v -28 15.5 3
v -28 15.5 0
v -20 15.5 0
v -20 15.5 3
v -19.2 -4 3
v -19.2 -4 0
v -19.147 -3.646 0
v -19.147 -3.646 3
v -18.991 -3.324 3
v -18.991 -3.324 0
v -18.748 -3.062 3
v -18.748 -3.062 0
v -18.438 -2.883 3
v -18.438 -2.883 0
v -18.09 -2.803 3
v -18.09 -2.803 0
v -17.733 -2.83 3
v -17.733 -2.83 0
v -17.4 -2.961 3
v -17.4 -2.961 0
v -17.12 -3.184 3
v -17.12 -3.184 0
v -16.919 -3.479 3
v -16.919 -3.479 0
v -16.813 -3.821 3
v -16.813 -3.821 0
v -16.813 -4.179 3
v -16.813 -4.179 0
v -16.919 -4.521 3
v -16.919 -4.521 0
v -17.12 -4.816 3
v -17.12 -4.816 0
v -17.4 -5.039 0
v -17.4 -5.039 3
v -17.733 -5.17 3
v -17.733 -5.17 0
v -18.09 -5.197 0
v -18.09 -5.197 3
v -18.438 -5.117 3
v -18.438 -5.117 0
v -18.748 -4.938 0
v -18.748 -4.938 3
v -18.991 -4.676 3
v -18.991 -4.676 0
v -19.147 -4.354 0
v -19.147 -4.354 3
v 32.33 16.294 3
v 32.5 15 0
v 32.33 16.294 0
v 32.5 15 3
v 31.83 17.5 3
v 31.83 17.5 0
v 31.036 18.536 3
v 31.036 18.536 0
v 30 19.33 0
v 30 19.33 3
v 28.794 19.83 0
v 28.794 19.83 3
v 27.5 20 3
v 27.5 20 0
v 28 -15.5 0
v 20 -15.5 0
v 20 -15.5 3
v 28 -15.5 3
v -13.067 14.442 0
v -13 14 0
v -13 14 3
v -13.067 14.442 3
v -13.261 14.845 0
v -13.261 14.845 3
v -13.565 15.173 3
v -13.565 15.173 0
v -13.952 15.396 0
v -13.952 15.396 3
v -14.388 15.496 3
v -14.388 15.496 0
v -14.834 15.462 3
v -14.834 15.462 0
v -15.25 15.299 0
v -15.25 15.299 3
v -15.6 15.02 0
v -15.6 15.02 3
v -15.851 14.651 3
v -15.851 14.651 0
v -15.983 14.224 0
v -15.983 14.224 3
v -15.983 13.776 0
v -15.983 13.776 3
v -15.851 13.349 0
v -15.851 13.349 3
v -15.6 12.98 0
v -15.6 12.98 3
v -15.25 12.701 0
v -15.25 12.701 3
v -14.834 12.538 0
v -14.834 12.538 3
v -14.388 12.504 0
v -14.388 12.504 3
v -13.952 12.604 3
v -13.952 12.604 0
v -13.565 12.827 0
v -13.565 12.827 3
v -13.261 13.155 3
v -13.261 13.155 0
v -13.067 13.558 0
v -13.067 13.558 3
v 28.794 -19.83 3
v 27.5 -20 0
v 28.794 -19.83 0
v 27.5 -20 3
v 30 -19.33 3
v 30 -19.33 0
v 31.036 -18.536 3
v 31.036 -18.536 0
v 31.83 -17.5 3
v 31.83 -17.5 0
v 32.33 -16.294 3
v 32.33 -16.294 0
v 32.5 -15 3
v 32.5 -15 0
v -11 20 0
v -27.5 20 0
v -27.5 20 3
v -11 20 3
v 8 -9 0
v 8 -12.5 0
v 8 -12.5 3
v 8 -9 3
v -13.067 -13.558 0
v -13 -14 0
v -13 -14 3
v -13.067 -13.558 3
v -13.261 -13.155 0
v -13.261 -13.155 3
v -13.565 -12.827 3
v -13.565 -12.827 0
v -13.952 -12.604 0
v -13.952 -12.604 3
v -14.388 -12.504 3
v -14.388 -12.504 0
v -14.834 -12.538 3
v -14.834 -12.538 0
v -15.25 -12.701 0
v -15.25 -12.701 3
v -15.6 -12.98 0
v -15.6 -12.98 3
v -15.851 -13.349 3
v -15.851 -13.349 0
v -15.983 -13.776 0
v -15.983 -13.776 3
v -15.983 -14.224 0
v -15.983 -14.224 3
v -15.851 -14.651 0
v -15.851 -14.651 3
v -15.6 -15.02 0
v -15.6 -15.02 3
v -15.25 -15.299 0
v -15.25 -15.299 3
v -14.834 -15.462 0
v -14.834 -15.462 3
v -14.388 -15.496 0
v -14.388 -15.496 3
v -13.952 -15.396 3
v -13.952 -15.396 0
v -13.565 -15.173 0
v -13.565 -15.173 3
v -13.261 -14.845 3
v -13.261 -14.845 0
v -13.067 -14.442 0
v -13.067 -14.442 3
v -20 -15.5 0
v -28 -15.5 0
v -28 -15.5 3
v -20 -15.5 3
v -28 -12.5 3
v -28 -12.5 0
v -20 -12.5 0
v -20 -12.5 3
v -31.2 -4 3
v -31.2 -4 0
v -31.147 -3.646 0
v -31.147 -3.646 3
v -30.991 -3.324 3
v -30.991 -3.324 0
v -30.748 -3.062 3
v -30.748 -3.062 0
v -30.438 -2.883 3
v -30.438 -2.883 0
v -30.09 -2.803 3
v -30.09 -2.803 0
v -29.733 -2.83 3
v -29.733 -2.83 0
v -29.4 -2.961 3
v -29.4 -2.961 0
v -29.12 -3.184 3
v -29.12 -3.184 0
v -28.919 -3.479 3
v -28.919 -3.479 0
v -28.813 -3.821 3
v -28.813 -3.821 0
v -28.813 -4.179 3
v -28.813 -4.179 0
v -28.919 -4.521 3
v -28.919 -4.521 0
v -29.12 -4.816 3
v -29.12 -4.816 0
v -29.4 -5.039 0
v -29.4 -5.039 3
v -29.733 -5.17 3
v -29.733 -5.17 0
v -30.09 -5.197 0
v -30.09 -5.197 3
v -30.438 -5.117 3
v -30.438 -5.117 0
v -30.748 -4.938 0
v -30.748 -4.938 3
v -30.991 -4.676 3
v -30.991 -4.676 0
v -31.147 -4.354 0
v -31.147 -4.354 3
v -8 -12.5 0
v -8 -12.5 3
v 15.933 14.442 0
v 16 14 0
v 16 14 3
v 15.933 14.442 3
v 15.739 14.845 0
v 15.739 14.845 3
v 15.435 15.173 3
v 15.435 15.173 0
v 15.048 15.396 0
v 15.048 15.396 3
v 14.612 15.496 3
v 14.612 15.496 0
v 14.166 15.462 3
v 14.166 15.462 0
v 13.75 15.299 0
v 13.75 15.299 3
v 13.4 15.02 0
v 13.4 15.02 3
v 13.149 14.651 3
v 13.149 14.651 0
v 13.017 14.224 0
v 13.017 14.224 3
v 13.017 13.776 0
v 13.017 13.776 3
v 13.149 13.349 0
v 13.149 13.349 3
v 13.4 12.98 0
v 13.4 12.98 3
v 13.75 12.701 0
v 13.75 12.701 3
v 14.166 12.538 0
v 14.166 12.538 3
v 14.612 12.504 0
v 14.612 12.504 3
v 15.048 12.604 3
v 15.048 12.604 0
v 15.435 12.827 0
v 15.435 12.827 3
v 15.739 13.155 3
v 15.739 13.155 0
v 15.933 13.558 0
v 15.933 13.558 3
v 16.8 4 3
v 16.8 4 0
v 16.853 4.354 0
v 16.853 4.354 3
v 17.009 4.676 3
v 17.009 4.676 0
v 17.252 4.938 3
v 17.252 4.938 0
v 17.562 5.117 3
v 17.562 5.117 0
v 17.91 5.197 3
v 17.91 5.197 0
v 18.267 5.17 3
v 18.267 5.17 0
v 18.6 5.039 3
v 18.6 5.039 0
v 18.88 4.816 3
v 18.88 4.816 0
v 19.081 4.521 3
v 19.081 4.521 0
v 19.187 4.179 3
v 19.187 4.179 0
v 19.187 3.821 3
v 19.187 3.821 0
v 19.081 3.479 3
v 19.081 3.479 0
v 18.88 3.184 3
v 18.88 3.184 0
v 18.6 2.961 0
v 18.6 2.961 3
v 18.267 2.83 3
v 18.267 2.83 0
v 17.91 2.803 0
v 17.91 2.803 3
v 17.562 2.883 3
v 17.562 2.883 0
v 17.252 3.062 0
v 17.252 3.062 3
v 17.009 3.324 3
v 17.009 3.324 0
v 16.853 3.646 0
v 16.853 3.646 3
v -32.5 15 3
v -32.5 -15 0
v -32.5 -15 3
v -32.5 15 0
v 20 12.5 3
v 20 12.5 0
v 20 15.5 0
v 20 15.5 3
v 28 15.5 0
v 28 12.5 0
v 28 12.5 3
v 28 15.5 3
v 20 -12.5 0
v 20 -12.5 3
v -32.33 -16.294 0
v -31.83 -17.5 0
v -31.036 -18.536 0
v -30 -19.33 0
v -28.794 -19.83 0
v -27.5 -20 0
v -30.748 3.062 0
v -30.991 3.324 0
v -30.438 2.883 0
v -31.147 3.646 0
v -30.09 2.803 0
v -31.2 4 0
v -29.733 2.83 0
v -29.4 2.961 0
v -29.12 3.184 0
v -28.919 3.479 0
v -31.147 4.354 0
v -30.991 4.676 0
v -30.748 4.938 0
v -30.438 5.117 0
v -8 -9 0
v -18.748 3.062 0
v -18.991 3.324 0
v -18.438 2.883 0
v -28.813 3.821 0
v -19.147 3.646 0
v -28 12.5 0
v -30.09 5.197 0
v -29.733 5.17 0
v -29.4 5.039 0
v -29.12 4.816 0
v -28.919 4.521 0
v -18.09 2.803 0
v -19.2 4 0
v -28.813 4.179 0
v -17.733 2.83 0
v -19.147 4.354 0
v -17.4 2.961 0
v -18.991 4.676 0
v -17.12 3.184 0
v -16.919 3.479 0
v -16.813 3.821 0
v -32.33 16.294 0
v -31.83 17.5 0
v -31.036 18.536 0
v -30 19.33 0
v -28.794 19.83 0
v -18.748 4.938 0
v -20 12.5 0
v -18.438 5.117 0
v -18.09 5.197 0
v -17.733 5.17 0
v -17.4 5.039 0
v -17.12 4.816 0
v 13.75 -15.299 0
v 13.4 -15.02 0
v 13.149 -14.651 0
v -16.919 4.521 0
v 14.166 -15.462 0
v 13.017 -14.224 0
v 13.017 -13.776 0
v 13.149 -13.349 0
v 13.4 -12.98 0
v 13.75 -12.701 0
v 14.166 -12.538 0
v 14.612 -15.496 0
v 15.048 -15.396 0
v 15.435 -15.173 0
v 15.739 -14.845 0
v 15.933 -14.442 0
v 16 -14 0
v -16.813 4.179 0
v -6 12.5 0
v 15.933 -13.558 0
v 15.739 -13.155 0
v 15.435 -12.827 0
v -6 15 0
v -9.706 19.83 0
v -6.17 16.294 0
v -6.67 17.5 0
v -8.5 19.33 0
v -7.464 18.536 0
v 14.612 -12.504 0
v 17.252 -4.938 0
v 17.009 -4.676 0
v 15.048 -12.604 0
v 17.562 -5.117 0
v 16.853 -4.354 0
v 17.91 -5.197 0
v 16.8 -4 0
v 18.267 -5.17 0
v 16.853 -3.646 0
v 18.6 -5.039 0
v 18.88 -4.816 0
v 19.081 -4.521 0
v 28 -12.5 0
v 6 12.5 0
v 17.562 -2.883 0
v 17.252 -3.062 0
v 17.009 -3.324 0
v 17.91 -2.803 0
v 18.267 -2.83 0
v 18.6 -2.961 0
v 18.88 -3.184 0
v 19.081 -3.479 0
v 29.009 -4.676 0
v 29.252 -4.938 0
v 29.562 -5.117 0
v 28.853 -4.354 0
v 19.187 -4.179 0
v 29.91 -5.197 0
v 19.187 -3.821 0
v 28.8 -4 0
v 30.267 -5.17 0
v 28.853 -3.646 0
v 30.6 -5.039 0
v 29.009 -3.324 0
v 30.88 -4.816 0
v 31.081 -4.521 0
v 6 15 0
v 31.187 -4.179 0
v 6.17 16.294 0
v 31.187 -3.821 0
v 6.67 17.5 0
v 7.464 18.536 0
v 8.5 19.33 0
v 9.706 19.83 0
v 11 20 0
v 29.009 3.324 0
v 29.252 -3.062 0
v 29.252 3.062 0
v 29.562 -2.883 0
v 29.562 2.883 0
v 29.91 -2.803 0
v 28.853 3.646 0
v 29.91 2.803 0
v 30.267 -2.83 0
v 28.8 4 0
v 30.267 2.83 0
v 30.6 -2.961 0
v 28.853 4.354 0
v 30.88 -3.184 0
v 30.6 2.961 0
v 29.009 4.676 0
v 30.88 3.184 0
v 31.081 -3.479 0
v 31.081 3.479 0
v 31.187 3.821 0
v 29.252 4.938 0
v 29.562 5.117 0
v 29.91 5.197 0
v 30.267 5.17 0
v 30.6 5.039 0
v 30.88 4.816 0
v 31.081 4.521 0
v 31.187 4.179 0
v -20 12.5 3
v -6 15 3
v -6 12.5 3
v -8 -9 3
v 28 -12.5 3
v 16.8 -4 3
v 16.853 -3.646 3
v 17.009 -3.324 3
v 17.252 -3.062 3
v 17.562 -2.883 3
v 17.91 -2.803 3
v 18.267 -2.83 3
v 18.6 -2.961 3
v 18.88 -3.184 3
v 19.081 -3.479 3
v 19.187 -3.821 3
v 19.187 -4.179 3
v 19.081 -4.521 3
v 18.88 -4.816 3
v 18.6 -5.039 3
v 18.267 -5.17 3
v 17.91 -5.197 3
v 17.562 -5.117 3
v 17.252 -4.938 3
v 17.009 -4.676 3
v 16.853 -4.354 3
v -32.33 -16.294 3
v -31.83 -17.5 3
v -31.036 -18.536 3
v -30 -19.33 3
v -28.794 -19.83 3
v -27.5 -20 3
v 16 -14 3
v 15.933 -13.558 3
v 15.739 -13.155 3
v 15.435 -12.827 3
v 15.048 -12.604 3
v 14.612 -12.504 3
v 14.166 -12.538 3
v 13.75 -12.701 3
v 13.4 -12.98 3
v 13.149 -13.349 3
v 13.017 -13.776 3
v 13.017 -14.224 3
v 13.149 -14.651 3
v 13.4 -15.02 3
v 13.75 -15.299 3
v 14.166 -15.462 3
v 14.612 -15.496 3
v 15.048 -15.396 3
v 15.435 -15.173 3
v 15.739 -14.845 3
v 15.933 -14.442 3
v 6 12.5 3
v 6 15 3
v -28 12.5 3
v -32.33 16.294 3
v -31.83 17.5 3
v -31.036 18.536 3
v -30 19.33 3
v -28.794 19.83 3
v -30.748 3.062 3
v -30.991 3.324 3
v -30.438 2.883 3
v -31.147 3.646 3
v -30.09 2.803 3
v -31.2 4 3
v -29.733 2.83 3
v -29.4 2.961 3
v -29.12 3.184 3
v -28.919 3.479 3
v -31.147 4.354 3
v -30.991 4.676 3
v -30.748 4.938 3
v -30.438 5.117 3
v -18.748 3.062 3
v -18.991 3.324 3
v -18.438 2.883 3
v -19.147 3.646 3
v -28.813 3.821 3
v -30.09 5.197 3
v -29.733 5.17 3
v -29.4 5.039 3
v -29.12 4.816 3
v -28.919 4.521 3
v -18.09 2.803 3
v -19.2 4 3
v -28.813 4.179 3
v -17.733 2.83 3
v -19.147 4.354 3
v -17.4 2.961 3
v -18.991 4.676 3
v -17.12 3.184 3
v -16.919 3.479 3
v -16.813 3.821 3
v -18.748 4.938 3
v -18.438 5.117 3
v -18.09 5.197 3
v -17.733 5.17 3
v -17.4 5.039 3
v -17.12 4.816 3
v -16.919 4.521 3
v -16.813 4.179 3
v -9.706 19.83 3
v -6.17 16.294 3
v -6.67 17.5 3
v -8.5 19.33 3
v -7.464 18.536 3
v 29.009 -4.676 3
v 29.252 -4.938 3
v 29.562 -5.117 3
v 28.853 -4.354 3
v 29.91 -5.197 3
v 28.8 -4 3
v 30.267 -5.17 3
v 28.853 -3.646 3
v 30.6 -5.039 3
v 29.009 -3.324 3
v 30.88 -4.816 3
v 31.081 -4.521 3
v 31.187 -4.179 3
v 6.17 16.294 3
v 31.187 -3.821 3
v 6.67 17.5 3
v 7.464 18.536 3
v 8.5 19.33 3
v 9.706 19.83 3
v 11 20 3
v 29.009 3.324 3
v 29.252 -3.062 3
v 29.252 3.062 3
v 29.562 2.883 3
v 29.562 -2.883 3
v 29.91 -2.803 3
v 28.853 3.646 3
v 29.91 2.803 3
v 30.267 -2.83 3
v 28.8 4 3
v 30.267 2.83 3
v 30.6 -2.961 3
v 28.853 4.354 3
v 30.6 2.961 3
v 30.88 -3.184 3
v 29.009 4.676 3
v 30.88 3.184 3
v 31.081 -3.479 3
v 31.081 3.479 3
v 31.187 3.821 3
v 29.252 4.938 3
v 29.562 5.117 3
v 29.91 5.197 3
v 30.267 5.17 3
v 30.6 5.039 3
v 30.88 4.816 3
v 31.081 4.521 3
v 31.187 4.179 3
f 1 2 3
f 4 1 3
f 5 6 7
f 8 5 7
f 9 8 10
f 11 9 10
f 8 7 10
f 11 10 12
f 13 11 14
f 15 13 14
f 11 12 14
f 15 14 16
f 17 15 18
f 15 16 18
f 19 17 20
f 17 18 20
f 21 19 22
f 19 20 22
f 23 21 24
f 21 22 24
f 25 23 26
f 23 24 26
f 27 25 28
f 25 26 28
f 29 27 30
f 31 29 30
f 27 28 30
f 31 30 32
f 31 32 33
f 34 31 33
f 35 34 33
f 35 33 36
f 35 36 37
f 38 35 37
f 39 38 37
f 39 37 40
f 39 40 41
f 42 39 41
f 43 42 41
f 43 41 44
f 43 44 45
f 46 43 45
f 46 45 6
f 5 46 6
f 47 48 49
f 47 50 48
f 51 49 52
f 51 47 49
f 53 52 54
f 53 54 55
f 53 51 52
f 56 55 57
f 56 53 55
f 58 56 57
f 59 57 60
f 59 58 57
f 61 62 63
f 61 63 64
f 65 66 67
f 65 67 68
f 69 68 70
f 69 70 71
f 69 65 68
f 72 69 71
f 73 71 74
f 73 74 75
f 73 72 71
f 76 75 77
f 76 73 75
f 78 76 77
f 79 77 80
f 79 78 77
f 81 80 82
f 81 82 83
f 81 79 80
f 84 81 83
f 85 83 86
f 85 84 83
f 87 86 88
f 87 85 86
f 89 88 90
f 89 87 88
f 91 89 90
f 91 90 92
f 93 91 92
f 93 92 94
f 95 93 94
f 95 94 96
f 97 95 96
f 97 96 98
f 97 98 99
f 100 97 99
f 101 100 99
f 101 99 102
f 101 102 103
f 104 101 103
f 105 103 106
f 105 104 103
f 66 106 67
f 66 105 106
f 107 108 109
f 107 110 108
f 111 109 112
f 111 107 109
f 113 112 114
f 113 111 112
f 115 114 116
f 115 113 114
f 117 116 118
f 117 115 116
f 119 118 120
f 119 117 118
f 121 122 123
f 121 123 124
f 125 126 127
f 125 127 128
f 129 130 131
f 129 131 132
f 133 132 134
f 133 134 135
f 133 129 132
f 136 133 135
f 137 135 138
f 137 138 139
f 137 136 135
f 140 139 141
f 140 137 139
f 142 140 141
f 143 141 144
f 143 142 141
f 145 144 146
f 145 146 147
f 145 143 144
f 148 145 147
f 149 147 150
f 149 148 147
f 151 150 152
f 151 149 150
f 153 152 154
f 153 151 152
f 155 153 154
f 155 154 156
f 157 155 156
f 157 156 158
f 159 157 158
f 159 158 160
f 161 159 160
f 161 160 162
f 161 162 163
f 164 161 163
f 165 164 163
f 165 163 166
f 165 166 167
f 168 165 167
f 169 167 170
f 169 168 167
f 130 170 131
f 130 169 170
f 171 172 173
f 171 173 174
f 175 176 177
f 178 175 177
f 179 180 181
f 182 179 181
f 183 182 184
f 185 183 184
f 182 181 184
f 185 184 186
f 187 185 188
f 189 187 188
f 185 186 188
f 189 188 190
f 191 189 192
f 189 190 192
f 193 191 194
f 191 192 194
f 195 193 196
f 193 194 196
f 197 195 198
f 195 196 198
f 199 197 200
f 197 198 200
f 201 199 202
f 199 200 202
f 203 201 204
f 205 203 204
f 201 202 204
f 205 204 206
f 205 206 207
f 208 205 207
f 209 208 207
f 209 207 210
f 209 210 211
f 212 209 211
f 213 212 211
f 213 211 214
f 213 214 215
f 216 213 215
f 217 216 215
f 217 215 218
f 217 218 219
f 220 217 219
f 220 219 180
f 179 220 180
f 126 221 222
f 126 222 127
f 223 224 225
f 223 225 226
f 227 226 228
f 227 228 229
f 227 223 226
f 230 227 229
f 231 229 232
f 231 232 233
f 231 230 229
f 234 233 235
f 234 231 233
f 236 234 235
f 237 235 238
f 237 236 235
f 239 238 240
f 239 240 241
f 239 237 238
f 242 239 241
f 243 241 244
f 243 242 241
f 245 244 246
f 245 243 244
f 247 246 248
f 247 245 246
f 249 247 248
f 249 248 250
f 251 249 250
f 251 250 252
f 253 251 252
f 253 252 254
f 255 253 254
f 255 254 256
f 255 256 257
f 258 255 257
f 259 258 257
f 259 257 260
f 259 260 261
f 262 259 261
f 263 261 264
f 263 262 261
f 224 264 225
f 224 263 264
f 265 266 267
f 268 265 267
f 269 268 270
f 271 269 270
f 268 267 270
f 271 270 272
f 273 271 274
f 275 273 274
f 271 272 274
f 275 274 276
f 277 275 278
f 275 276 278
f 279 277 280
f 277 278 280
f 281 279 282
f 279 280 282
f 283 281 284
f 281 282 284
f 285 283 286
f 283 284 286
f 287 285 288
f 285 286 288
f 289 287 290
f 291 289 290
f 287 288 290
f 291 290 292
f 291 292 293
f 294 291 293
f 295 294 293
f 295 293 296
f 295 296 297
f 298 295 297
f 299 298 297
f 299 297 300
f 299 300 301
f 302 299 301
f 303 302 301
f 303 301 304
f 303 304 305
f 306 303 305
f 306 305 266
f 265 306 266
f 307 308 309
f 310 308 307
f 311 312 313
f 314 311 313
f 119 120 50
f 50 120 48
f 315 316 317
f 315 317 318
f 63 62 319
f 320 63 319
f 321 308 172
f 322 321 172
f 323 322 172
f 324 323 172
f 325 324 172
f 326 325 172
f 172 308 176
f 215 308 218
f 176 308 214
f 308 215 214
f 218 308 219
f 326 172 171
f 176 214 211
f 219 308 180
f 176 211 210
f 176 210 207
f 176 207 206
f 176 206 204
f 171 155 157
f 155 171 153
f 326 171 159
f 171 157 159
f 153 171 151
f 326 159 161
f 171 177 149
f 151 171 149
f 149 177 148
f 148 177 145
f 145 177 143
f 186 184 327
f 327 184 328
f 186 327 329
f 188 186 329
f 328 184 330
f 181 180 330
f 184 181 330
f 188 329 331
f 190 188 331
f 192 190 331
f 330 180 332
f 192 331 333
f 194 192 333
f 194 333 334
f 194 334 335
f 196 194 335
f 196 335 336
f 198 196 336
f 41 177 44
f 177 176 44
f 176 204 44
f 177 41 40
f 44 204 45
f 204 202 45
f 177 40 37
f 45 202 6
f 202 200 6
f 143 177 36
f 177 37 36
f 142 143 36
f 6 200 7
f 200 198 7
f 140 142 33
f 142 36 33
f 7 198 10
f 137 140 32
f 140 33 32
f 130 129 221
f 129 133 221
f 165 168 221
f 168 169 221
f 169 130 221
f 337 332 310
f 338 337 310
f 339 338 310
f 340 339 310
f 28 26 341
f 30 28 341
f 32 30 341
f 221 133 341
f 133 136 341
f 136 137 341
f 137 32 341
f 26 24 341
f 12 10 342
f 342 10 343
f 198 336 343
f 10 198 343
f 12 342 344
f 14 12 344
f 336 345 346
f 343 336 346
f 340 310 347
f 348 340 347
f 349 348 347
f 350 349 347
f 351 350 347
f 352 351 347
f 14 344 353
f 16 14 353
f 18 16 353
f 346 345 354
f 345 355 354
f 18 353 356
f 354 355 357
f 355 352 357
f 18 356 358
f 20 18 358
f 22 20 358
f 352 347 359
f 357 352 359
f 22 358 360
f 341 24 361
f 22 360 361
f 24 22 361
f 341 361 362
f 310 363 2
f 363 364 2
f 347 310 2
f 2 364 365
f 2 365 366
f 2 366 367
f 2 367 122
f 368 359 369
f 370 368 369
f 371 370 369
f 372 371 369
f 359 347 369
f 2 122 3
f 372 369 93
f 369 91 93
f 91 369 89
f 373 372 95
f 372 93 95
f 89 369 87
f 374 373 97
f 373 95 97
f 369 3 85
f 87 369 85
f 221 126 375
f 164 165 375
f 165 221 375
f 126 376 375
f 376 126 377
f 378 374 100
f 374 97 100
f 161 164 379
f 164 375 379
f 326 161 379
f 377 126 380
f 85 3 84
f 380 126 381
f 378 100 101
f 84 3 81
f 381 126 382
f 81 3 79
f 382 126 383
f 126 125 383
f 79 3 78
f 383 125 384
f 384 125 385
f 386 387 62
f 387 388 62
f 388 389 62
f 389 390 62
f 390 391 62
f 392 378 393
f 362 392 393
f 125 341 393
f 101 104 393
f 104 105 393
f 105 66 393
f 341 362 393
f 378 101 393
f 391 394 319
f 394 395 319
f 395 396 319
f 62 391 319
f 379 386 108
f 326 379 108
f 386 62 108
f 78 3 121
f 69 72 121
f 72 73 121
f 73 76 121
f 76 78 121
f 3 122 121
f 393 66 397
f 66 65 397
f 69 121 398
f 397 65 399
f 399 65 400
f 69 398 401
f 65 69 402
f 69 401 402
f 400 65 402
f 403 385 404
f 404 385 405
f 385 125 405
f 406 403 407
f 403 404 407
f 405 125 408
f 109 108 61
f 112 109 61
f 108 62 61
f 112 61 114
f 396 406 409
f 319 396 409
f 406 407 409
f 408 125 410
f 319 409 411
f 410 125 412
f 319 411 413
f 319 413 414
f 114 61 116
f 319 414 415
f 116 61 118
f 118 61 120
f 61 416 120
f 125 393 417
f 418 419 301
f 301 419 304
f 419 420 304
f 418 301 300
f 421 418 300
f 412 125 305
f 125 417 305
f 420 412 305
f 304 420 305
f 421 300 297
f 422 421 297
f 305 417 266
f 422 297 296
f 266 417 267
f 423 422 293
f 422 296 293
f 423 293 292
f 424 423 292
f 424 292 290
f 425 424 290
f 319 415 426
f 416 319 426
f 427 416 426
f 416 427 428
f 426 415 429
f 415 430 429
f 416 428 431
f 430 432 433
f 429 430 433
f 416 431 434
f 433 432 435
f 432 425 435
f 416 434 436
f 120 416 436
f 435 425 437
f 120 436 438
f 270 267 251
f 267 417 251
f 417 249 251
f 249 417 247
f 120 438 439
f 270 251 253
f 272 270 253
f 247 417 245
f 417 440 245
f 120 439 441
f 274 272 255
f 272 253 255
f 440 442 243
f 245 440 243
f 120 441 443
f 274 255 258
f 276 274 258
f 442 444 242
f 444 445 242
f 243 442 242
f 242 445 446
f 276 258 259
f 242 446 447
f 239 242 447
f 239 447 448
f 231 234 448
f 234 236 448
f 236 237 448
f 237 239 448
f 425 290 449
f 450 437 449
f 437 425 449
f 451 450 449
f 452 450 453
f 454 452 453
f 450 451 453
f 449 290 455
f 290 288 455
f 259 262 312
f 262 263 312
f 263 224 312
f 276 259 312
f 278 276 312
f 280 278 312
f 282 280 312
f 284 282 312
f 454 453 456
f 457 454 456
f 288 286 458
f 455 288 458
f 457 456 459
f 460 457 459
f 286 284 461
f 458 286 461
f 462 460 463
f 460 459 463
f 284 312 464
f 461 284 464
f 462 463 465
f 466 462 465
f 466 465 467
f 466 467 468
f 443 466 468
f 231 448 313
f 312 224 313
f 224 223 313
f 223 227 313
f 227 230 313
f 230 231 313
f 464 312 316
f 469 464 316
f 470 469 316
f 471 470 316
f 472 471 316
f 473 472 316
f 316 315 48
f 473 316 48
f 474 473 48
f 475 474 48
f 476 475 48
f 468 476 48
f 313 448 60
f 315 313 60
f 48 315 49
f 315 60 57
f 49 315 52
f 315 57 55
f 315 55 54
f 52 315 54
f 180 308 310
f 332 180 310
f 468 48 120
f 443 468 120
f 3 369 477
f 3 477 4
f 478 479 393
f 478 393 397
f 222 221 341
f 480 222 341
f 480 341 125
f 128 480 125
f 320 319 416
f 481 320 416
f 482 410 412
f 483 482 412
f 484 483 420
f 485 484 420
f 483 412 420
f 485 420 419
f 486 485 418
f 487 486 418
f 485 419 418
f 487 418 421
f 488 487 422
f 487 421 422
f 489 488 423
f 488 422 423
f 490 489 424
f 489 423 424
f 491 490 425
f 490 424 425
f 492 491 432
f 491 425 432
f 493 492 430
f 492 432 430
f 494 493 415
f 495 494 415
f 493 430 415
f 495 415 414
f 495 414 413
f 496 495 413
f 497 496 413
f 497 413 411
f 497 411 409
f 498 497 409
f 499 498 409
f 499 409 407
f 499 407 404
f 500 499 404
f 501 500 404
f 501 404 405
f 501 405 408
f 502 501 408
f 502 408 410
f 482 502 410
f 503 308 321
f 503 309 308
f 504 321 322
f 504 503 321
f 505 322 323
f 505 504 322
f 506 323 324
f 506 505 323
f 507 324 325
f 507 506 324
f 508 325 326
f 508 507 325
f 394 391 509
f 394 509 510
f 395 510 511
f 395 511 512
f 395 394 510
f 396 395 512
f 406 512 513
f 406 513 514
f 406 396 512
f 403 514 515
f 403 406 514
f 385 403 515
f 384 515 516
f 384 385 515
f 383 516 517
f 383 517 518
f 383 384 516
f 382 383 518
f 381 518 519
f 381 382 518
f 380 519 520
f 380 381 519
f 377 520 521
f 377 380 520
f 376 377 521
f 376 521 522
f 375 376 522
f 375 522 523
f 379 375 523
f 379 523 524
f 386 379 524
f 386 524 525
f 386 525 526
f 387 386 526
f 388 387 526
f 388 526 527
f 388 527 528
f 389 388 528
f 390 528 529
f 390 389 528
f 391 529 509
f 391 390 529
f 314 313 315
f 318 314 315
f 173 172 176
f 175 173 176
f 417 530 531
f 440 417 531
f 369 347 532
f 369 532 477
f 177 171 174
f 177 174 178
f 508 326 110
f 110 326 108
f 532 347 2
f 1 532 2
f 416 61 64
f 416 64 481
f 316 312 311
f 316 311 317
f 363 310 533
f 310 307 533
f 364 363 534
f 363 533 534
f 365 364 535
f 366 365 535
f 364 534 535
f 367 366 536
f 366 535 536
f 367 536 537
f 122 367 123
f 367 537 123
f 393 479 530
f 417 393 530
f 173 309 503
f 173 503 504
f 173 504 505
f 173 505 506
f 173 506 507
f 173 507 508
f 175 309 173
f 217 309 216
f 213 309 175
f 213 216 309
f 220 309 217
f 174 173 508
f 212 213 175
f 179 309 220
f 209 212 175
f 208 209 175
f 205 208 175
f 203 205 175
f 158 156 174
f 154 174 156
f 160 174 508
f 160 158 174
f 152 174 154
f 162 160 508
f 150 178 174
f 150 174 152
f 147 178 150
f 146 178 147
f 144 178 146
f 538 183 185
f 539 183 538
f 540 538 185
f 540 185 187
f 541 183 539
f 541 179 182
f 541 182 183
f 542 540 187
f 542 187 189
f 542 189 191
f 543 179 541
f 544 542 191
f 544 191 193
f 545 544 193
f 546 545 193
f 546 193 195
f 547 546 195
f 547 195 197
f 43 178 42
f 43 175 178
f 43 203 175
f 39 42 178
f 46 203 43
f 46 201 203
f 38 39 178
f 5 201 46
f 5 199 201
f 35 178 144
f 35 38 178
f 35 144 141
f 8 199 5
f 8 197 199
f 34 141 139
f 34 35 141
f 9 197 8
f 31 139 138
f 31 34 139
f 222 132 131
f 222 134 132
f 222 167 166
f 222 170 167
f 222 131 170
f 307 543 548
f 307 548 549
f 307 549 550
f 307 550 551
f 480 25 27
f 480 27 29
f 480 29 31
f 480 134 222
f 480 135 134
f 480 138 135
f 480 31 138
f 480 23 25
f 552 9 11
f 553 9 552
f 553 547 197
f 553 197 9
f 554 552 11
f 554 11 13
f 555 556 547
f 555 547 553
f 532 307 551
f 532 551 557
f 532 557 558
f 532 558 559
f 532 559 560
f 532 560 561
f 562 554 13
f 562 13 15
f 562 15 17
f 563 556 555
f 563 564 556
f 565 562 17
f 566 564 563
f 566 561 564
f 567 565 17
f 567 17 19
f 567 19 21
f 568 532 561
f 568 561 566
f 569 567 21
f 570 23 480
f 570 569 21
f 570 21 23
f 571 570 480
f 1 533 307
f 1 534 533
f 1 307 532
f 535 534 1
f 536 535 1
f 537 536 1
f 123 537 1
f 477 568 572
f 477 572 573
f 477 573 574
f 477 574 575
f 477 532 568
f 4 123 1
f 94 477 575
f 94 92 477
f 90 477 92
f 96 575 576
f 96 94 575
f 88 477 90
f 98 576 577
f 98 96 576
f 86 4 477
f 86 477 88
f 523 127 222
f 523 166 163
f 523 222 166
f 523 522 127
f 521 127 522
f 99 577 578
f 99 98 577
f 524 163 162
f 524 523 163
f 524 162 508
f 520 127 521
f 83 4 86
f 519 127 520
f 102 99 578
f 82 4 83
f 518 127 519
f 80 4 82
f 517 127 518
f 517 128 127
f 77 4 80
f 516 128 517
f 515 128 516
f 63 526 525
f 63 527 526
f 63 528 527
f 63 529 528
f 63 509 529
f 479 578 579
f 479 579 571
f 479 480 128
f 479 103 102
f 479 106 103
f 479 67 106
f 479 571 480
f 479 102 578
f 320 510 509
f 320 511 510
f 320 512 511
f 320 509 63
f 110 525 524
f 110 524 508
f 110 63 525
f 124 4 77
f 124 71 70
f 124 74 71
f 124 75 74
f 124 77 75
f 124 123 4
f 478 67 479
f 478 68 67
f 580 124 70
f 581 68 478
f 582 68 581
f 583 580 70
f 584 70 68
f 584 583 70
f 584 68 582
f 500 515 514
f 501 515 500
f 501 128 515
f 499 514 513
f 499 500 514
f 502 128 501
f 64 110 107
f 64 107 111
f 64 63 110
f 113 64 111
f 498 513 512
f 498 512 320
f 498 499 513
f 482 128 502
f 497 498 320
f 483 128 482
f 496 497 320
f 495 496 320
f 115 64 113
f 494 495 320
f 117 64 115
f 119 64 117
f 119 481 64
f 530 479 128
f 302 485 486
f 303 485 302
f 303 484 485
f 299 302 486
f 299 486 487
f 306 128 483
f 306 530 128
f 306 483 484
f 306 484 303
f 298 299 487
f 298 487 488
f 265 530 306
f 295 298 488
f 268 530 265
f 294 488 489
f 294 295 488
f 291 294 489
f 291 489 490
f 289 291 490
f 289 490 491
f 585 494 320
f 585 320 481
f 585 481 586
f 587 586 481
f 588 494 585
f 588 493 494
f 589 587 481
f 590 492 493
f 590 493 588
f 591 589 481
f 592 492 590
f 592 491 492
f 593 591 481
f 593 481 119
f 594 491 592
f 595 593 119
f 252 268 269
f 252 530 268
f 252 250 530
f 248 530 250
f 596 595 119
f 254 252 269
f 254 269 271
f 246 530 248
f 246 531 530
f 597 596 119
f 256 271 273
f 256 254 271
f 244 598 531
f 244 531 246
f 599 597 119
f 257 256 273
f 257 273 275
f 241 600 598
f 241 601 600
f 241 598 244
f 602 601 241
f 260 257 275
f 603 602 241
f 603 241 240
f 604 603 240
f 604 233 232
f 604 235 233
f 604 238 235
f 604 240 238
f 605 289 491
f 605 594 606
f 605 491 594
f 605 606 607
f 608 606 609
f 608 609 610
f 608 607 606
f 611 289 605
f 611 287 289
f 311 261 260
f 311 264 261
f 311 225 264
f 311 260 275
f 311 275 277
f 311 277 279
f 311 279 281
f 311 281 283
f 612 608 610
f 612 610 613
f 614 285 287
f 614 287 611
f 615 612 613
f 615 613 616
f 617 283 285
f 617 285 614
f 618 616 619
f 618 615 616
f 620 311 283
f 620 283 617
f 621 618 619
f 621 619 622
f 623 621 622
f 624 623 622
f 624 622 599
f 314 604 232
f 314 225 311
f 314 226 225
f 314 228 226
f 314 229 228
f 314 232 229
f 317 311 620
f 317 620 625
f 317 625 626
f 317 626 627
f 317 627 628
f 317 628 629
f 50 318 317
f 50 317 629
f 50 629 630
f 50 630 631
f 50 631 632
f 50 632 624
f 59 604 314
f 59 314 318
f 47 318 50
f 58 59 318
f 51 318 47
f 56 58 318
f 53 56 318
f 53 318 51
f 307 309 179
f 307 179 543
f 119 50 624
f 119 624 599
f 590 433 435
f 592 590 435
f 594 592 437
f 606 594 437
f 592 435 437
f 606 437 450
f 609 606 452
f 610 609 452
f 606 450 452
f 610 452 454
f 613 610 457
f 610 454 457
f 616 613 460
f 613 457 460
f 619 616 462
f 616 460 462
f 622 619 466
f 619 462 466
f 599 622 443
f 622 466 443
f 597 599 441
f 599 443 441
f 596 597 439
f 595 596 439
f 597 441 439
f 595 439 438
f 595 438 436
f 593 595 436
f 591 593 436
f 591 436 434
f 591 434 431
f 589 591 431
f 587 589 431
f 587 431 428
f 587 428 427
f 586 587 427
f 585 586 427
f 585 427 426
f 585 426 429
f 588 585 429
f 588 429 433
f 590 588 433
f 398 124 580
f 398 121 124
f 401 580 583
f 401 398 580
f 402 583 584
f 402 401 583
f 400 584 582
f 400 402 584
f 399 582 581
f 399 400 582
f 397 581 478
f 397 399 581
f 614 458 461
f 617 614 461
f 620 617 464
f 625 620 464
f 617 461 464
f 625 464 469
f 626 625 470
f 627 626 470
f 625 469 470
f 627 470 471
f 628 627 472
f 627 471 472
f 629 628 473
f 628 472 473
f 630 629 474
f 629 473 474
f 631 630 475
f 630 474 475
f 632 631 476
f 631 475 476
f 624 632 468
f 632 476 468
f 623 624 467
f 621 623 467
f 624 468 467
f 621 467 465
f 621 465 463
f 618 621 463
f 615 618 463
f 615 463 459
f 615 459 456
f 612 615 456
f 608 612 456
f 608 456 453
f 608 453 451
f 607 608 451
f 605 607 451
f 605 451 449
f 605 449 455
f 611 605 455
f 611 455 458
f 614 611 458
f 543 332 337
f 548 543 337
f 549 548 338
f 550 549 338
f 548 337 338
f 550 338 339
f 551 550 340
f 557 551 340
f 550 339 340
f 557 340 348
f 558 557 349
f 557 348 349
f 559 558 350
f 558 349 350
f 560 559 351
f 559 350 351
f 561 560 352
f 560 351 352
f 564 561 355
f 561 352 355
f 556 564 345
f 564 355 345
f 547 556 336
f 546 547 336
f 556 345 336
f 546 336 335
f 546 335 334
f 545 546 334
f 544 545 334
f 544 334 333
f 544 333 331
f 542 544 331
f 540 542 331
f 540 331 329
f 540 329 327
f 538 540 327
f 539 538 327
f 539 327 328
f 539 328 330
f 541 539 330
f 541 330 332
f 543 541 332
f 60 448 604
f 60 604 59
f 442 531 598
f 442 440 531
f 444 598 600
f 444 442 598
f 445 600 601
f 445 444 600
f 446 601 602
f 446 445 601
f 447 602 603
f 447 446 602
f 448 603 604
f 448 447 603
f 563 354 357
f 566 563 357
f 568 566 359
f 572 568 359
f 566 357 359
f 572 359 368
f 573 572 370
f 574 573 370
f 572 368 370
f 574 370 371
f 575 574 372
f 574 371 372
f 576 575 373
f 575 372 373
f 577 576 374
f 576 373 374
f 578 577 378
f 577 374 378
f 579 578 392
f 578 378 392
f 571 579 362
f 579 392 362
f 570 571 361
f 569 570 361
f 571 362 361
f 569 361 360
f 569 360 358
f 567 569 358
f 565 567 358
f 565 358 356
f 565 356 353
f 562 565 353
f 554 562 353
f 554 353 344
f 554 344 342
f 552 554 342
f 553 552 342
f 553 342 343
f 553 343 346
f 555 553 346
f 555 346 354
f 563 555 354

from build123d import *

# Parameters (mm, degrees)
F1_W     = 65
F1_H     = 40
F1_W_2   = 8
F1_H_2   = 3
F1_R     = 1.5
F1_W_3   = 16
F1_H_3   = 3.5
F2_DEPTH = 3
F4_D     = 2.4
F5_W     = 12
F5_H     = 7.5
F6_DEPTH = 25
F7_R     = 5


with BuildPart() as f2:
    # F1 (on Top) → F2 (new body)
    with BuildSketch(Plane.XY):
        Rectangle(F1_W, F1_H)
        with Locations((-24, -14)):
            Rectangle(F1_W_2, F1_H_2, mode=Mode.SUBTRACT)
        with Locations((-14.5, -14)):
            Circle(F1_R, mode=Mode.SUBTRACT)
        with Locations((0, -10.75)):
            Rectangle(F1_W_3, F1_H_3, mode=Mode.SUBTRACT)
        with Locations((14.5, -14)):
            Circle(F1_R, mode=Mode.SUBTRACT)
        with Locations((24, -14)):
            Rectangle(F1_W_2, F1_H_2, mode=Mode.SUBTRACT)
        with Locations((-24, 14)):
            Rectangle(F1_W_2, F1_H_2, mode=Mode.SUBTRACT)
        with Locations((-14.5, 14)):
            Circle(F1_R, mode=Mode.SUBTRACT)
        with Locations((14.5, 14)):
            Circle(F1_R, mode=Mode.SUBTRACT)
        with Locations((24, 14)):
            Rectangle(F1_W_2, F1_H_2, mode=Mode.SUBTRACT)
    extrude(amount=F2_DEPTH)

    # F4 (through all)
    with Locations(Plane.XY.offset(3)):
        with Locations((-30, 4), (-30, -4), (-18, 4), (-18, -4), (18, 4), (18, -4), (30, 4), (30, -4)):
            Hole(F4_D / 2)

    # F5 (on face) → F6 (cut)
    with BuildSketch(Plane.XY.offset(3)):
        with Locations((0, 16.25)):
            Rectangle(F5_W, F5_H)
    extrude(amount=-F6_DEPTH, mode=Mode.SUBTRACT)

    # F7
    f7_edges = [f2.edges().sort_by_distance(p)[0] for p in [
        (-32.5, -20, 1.5),
        (-32.5, 20, 1.5),
        (32.5, -20, 1.5),
        (32.5, 20, 1.5),
        (-6, 20, 1.5),
        (6, 20, 1.5),
    ]]
    fillet(f7_edges, radius=F7_R)


solid = f2.part
